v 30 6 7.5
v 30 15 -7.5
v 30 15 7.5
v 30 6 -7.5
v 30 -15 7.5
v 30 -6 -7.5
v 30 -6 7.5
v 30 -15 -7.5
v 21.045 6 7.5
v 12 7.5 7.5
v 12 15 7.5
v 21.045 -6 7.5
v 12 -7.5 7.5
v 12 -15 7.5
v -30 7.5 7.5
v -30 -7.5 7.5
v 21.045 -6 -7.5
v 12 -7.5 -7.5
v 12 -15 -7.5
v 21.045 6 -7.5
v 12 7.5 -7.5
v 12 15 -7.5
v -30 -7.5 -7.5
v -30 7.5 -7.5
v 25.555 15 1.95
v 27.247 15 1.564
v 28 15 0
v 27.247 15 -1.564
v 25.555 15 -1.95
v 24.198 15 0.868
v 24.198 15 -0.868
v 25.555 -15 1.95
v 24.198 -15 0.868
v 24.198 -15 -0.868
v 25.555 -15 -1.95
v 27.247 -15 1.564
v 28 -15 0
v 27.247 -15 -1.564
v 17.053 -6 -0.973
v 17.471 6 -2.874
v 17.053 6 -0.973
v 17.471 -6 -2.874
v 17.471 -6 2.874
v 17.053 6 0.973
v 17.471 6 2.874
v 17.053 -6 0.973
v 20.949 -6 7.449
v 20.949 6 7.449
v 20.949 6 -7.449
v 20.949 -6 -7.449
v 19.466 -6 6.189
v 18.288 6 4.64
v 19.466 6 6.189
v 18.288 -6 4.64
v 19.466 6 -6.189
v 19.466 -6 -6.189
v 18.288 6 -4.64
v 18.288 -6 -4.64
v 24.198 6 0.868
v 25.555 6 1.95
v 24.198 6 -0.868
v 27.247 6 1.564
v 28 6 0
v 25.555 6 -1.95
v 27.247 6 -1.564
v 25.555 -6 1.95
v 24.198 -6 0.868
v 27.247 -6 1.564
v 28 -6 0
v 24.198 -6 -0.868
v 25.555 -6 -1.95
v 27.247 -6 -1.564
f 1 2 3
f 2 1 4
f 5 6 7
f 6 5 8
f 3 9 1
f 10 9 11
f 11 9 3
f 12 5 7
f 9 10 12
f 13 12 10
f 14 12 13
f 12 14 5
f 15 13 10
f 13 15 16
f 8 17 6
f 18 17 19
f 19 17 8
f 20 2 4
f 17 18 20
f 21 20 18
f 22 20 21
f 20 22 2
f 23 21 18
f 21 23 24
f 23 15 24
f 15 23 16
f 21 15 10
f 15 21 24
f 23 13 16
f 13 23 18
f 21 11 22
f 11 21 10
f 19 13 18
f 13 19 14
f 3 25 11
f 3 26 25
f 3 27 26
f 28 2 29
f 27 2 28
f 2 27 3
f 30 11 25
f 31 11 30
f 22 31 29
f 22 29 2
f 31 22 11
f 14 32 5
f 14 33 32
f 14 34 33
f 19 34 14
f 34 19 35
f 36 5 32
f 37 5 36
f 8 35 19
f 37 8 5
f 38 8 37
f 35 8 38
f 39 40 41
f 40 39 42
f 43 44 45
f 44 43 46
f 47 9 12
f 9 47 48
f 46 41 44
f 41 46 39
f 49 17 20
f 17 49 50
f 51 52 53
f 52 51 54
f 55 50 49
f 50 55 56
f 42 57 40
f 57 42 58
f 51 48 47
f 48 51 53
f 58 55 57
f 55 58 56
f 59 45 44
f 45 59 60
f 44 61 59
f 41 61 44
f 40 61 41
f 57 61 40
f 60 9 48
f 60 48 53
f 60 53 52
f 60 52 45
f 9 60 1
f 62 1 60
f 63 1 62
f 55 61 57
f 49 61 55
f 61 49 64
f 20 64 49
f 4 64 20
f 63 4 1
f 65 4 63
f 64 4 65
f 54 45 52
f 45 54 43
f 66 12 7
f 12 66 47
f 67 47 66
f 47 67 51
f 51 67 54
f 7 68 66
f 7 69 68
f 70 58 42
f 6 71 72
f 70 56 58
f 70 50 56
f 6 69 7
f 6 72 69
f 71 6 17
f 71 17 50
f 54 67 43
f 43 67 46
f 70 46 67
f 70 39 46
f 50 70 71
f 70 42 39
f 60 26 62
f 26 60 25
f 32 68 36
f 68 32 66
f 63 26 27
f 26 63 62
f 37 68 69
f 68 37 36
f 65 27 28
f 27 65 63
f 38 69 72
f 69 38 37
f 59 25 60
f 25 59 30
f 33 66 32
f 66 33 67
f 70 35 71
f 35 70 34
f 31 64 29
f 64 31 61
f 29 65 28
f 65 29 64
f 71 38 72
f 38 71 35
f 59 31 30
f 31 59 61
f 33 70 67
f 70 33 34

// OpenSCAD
lathe_tool();

module lathe_tool()
{
	length = 60;
	width = 15;
	height = 15;
	hole = 4;
	diameter = 18;
	gearWidth = 12;

	cubeLength = diameter;

	difference()
	{
		union()
		{
			cube(size=[length, width, height], center = true);
			translate([length/2-cubeLength/2, 0, 0])
				cube(size=[cubeLength, width*2, height], center=true);
		}

		translate([length/2-hole, 0, 0])
			rotate([90, 0, 0])
				cylinder(r=diameter/2, h=gearWidth, center=true);

		translate([length/2-hole, 0, 0])
			rotate([90, 0, 0])
				cylinder(r=hole/2, h=width*2, center=true);
	}
}
